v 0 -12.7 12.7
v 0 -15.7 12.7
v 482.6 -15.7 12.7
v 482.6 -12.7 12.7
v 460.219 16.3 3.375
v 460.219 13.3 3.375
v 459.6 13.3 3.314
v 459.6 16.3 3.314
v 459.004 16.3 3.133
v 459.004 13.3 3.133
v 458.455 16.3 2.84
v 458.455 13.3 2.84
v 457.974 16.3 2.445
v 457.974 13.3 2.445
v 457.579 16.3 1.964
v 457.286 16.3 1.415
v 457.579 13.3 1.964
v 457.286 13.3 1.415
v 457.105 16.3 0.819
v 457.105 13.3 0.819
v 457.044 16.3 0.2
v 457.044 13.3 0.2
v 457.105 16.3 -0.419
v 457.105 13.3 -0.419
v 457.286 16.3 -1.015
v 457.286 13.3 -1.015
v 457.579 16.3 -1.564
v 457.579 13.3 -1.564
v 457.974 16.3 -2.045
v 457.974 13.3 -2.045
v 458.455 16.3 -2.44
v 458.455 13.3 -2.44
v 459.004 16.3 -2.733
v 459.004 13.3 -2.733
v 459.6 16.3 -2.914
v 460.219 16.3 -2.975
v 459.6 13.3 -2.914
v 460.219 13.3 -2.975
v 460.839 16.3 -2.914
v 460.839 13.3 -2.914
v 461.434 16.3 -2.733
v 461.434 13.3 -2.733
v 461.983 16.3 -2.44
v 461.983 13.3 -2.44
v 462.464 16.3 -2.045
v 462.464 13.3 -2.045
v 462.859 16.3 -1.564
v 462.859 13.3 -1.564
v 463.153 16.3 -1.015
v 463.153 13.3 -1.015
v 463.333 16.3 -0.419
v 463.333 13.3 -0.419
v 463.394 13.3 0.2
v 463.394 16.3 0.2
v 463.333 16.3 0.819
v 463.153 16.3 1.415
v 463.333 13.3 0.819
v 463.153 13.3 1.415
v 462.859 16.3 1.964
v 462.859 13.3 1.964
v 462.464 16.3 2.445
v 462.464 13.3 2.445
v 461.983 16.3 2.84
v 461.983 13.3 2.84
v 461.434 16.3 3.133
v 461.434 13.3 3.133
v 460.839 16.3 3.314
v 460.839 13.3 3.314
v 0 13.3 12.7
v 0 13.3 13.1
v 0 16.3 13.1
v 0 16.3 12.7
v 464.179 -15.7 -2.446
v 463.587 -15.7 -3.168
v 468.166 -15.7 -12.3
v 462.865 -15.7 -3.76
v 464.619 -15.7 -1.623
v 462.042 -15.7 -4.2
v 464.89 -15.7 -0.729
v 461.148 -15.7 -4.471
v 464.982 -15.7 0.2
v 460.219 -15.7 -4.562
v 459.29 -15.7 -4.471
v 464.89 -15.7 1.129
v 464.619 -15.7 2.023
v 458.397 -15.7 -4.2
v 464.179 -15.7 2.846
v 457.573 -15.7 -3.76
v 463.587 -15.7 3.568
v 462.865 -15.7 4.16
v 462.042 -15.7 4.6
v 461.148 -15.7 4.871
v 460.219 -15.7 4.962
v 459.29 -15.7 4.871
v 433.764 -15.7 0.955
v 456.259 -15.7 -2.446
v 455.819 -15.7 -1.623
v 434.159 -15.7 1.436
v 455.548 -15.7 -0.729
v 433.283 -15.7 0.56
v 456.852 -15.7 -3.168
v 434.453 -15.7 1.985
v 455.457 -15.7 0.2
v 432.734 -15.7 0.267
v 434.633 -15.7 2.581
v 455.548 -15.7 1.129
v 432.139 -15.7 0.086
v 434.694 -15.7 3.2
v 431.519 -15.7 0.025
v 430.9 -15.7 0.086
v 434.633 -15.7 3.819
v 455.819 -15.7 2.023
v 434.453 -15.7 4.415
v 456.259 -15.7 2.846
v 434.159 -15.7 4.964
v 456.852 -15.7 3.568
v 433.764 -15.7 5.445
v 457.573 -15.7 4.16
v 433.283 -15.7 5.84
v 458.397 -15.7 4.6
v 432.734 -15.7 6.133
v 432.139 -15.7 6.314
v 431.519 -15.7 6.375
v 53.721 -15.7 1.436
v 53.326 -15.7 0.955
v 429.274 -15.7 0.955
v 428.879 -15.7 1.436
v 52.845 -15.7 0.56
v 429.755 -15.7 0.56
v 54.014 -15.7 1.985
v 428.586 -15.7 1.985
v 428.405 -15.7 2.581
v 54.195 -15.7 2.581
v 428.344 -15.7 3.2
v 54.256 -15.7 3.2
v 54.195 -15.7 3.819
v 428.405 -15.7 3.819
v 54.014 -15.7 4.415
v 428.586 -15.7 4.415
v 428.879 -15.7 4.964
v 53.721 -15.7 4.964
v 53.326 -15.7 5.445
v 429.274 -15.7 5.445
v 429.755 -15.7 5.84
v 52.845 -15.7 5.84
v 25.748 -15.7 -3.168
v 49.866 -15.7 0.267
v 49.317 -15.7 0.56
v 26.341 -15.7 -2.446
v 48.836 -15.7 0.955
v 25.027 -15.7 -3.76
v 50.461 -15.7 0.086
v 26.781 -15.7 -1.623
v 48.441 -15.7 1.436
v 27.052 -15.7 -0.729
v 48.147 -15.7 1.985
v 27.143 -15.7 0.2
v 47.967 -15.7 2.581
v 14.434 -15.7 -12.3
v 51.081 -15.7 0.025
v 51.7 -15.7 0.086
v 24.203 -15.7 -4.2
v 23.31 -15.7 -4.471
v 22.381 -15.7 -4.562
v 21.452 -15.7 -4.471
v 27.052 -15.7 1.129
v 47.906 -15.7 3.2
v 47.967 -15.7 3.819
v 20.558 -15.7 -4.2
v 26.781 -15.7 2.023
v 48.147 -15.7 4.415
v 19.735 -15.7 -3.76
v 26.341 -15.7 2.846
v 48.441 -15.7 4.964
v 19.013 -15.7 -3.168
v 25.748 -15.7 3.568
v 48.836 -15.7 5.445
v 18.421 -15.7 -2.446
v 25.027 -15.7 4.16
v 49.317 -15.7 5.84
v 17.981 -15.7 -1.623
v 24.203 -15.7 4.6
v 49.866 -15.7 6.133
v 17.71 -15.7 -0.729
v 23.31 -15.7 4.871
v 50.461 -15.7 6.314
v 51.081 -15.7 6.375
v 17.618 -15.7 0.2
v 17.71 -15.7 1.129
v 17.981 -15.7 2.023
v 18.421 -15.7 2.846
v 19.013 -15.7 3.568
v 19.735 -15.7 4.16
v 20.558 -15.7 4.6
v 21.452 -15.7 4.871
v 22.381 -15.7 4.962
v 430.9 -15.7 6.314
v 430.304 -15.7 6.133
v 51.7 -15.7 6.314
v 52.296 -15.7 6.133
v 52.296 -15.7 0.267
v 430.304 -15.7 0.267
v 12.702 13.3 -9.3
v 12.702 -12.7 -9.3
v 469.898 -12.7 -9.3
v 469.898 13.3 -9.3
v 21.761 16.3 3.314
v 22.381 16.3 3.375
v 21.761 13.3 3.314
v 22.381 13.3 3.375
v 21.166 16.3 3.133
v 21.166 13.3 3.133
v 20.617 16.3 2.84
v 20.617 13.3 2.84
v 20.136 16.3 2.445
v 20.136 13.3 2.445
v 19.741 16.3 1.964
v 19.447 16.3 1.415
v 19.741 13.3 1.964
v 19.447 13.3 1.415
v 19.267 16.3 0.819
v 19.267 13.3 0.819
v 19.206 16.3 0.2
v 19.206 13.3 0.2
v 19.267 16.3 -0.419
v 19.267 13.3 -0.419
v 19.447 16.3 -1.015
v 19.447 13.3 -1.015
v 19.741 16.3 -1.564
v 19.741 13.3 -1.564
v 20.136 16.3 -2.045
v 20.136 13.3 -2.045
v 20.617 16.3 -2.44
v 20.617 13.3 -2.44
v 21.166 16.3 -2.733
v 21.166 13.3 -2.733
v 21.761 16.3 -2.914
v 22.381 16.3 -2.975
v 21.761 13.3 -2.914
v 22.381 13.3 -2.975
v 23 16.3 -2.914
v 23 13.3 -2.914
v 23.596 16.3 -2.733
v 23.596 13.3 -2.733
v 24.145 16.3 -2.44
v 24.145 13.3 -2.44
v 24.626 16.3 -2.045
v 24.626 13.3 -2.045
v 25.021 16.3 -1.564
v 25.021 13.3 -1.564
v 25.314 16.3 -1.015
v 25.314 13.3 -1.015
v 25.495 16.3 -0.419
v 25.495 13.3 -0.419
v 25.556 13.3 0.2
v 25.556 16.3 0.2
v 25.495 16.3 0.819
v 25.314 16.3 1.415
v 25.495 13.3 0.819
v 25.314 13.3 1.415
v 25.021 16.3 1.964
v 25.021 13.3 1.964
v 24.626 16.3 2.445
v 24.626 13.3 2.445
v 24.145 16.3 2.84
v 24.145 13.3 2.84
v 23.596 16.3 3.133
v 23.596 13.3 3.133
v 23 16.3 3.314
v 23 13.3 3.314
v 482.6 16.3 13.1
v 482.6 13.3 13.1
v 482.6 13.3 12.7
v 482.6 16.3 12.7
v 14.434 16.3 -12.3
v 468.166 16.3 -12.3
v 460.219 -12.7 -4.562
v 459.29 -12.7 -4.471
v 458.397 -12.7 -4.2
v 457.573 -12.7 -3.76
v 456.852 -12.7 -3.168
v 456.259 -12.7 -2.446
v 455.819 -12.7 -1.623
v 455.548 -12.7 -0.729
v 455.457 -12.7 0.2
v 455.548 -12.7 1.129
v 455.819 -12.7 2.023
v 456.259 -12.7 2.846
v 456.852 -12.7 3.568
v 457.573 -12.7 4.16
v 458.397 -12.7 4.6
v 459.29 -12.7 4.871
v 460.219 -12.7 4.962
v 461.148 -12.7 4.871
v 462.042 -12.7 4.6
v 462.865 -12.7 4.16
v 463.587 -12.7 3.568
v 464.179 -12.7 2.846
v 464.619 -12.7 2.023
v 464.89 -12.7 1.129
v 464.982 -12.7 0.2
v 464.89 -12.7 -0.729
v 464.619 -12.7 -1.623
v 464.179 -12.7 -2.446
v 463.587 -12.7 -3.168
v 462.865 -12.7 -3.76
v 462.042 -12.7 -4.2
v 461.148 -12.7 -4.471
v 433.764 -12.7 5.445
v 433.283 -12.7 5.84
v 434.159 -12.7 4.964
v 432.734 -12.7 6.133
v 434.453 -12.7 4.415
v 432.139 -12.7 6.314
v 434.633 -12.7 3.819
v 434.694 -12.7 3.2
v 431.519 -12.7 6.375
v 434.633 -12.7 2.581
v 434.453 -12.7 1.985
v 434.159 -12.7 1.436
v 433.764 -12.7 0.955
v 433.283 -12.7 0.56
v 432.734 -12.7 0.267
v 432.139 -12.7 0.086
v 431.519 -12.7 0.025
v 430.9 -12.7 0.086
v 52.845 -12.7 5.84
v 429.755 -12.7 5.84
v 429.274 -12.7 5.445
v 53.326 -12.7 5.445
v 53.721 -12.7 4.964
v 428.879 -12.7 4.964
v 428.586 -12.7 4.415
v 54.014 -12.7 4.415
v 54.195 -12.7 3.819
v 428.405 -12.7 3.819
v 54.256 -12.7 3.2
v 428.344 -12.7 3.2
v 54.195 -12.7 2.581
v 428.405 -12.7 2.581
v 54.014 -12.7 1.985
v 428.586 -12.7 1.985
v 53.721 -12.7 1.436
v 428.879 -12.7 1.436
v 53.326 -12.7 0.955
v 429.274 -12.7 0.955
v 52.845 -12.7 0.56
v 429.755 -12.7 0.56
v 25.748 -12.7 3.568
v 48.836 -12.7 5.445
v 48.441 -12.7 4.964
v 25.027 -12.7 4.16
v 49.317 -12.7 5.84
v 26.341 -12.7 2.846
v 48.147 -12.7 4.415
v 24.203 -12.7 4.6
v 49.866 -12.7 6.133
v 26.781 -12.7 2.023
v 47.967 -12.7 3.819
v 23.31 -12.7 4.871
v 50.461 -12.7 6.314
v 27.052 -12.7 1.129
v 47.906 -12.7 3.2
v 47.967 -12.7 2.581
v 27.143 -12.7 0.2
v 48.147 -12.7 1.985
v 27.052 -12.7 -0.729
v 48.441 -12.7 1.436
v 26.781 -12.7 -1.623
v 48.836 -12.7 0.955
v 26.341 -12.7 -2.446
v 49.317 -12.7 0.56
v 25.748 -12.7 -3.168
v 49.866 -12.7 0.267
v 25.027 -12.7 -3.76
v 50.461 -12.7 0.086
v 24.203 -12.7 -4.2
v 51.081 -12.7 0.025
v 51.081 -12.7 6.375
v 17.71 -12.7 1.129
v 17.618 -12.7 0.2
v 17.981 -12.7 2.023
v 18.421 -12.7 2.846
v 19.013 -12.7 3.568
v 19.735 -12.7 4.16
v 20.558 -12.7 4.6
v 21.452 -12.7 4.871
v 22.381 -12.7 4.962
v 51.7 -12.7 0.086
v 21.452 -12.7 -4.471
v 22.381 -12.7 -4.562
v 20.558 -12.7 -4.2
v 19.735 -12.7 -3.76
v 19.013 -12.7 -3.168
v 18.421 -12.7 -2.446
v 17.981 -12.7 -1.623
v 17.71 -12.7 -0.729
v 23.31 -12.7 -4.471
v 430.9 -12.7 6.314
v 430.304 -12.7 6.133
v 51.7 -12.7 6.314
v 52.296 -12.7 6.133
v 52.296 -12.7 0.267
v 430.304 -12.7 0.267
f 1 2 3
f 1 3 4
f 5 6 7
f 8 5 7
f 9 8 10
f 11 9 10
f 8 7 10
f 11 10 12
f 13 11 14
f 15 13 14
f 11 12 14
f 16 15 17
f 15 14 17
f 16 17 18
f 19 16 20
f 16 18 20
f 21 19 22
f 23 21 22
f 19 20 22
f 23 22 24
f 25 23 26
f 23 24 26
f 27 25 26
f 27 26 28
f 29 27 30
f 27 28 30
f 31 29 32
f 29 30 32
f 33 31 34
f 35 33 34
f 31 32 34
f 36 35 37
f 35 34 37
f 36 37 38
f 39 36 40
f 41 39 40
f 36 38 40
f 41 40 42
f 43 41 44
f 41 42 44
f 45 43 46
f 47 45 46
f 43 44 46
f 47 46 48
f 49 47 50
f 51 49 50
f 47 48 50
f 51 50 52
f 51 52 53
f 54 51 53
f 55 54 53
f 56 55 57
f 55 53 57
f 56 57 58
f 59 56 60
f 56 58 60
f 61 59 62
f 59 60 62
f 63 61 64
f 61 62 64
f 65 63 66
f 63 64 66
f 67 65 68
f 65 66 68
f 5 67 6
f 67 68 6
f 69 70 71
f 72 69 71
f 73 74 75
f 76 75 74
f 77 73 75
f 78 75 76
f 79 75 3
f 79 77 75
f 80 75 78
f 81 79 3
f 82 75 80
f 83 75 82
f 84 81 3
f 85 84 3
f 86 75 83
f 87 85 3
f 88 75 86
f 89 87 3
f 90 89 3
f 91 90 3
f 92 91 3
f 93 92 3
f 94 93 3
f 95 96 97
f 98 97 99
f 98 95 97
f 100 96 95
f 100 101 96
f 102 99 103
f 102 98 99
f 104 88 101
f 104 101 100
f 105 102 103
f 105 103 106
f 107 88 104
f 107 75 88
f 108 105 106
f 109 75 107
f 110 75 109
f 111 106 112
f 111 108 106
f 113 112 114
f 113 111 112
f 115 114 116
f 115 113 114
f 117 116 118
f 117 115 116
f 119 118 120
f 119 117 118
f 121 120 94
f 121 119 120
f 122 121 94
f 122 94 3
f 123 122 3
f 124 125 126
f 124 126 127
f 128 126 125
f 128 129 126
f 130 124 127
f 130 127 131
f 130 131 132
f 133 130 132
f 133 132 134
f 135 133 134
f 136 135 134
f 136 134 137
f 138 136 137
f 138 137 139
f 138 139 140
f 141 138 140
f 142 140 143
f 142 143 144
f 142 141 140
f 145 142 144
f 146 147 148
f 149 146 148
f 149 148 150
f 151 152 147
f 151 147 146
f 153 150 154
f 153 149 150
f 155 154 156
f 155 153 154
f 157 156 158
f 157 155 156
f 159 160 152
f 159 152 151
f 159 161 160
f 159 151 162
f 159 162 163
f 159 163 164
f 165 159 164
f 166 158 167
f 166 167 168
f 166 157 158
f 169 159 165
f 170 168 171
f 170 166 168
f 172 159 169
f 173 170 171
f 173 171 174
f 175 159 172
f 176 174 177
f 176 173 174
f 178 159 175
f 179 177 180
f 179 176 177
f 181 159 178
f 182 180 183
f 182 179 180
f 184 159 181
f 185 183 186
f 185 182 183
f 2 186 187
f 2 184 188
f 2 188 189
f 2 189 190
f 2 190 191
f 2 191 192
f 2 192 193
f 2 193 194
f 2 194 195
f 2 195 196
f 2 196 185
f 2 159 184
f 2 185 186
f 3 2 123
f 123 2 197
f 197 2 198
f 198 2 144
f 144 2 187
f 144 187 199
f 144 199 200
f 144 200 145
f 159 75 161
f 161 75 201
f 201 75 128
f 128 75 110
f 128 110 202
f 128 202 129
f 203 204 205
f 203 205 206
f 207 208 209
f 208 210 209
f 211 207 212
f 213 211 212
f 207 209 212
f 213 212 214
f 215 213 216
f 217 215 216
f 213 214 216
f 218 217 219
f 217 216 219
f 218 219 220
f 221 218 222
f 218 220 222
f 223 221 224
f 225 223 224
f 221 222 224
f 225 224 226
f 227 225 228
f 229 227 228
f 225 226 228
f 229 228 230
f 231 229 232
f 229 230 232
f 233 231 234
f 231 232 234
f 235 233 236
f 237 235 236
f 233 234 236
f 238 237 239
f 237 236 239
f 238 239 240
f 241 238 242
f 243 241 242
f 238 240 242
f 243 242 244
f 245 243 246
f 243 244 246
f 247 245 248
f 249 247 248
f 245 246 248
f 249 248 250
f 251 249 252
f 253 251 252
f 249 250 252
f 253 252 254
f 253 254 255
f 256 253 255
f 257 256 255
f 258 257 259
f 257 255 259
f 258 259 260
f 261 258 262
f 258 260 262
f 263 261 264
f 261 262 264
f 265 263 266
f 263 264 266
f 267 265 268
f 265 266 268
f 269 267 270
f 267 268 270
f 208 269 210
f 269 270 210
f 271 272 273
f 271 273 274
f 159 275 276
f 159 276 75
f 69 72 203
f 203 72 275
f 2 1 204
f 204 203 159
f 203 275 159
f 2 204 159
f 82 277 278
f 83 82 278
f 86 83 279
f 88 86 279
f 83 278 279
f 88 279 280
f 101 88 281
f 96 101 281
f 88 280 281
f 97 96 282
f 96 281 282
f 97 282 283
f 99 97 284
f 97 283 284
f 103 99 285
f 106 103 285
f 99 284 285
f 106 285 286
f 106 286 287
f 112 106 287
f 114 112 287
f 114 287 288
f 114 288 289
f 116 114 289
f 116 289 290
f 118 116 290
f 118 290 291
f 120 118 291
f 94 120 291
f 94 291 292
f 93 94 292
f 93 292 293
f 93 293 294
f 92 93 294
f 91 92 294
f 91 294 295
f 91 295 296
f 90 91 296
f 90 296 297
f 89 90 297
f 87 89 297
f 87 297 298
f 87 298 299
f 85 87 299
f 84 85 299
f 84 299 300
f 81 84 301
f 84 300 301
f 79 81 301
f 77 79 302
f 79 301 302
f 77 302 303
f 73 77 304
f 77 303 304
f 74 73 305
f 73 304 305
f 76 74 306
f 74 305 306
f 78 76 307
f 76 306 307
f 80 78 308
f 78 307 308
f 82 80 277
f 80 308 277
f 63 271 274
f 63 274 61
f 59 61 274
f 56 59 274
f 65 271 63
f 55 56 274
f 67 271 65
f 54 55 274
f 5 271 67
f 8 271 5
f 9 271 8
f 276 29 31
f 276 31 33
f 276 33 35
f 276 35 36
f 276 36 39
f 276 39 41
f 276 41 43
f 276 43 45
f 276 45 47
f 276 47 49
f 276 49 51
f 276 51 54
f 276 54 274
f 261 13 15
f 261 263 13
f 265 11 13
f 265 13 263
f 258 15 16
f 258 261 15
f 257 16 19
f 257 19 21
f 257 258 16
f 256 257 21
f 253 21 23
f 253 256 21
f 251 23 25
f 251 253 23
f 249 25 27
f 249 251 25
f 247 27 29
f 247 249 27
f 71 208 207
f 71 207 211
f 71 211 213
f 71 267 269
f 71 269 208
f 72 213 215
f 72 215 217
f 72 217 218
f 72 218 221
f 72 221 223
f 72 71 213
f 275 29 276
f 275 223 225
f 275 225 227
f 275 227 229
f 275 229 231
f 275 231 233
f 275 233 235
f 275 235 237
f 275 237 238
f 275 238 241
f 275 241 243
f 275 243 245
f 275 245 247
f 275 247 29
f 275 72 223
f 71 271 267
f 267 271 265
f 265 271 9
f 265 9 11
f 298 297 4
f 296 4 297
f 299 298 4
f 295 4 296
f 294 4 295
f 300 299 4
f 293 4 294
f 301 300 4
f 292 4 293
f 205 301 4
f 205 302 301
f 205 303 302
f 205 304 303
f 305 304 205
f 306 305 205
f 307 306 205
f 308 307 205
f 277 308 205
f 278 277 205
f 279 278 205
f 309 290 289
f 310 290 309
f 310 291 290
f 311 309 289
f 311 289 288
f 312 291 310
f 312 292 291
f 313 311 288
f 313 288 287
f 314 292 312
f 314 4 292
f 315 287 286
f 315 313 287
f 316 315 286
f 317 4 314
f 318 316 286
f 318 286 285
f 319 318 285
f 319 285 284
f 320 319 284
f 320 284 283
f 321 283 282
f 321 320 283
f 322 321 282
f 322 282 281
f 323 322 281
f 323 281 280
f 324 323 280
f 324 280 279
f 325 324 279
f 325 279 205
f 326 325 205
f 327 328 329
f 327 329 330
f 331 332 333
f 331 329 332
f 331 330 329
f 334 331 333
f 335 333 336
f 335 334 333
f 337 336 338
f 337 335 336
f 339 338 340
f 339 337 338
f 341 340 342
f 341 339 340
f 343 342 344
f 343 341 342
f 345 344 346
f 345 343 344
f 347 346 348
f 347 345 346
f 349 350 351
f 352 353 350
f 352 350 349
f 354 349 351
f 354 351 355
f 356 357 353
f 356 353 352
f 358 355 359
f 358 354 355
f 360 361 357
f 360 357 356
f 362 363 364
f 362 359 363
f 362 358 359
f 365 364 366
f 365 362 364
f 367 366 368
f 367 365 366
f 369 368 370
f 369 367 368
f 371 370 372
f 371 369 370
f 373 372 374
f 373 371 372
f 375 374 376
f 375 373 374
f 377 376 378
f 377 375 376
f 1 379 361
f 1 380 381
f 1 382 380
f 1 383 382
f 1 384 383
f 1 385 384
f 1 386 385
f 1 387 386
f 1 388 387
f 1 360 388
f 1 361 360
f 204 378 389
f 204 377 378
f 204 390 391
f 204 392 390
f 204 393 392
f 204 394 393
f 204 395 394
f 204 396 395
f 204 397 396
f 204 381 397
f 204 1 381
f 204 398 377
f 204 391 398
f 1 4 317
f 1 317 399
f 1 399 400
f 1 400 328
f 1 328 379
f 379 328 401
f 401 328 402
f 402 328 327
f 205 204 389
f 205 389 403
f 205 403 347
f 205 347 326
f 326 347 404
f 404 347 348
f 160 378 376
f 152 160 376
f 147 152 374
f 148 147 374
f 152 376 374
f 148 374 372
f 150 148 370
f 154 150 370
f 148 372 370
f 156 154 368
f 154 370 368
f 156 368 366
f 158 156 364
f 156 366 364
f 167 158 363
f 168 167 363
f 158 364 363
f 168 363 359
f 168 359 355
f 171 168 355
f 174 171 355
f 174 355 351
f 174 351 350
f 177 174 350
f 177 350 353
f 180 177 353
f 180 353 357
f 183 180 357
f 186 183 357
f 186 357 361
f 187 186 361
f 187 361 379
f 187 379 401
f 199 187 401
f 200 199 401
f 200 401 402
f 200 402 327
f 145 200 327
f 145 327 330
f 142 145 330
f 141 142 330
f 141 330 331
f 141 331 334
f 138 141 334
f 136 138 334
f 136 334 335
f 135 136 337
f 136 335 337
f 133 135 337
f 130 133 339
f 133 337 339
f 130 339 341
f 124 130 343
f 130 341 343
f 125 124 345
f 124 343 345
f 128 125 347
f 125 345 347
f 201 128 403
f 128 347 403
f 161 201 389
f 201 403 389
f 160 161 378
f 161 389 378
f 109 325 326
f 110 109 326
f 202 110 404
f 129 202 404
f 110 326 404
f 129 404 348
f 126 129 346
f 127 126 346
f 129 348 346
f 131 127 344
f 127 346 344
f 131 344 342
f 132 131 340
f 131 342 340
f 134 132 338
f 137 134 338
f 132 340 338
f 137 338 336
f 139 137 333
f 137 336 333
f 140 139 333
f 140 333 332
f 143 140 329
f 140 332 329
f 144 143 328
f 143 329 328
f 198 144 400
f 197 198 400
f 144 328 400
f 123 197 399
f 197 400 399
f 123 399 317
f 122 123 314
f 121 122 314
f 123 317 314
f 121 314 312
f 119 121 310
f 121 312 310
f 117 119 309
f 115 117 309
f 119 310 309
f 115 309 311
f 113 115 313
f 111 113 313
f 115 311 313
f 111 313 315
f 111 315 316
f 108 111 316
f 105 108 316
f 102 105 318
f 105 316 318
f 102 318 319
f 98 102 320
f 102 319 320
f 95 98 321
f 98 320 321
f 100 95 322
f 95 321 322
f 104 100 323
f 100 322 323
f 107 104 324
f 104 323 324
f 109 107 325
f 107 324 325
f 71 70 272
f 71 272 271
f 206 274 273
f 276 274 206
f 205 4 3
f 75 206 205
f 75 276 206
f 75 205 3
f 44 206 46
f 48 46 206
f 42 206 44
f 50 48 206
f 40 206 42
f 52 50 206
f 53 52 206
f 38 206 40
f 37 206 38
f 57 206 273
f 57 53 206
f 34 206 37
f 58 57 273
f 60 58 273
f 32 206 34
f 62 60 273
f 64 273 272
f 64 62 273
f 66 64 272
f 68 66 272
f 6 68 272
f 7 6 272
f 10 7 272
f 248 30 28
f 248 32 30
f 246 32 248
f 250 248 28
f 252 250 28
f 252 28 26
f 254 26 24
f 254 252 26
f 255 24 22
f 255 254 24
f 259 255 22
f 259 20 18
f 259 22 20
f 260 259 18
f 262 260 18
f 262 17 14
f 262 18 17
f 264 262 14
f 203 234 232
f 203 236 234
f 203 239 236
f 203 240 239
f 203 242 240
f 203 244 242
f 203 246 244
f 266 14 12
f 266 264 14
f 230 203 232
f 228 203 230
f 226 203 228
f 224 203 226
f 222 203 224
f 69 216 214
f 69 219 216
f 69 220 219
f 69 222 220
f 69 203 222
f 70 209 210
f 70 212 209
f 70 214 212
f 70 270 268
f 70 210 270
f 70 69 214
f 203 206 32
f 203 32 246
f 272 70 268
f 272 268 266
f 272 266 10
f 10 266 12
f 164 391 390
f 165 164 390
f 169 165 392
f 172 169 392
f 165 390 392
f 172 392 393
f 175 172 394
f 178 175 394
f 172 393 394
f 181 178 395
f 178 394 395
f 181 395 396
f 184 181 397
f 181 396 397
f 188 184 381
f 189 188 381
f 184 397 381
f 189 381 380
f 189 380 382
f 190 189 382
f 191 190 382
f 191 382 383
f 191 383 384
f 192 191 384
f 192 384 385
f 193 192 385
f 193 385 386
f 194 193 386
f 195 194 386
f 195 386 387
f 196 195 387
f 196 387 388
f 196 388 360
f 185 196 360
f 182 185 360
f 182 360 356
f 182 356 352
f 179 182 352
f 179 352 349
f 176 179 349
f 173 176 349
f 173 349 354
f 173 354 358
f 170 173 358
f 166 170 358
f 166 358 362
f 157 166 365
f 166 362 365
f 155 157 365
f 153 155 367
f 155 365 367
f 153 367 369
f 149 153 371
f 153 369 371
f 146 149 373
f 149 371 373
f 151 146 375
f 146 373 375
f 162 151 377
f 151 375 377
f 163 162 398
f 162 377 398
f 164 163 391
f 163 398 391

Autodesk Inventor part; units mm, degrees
ref_plane "YZ Plane" through (0, 0, 0) normal (1, 0, 0) x (0, 1, 0)
ref_plane "XZ Plane" through (0, 0, 0) normal (0, 1, 0) x (-1, 0, 0)
ref_plane "XY Plane" through (0, 0, 0) normal (0, 0, 1) x (1, 0, 0)
sketch "Sketch1" plane through (0, 0, 0) normal (1, 0, 0) x (0, 1, 0)
  line L0 (-15.7, 12.7) -> (-12.7, 12.7)
  line L1 (-12.7, 12.7) -> (-12.7, -9.3)
  line L2 (-12.7, -9.3) -> (13.3, -9.3)
  line L3 (13.3, -9.3) -> (13.3, 13.1)
  line L4 (13.3, 13.1) -> (16.3, 13.1)
  line L5 (16.3, 13.1) -> (16.3, -12.3)
  line L6 (16.3, -12.3) -> (-15.7, -12.3)
  line L7 (-15.7, -12.3) -> (-15.7, 12.7)
  point P0 (0, 0)
  point P1 (0.3, 0.2)
  dimension "d0" = 3
  dimension "d1" = 3
  dimension "d2" = 25
  dimension "d3" = 32
  dimension "d4" = 16
  dimension "d5" = 12.5
  dimension "d6" = 3
  dimension "d44" = 22.4
  dimension "d45" = 16.3
  dimension "d46" = 13.1
extrude "Extrusion1" add sketch "Sketch1" along normal blind 482.6
sketch "Sketch3" plane through (0.7366, -15.7, 12.7) normal (0, -1, 0) x (1, 0, 0)
  line L0 (0, 0) -> (14.6558, -25.4) projected
  line L1 (-0.7366, -25) -> (481.8634, -25) projected
  line L2 (466.471, -25.4) -> (481.1268, 0) projected
  line L3 (-0.7366, 0) -> (481.8634, 0) projected
  line L4 (7.3279, -12.7) -> (473.7989, -12.7) construction
  line L5 (14.4316, 0) -> (28.8566, -25) construction
  circle A0 centre (21.6441, -12.5) radius 4.7625
  line L6 (466.6952, 0) -> (452.2702, -25) construction
  circle A1 centre (459.4827, -12.5) radius 4.7625
  point P0 (-0.7366, -12.7)
  dimension "d18" = 12.5
  dimension "d19" = 9.525
  dimension "d20" = 12.5
  dimension "d21" = 9.525
hole "Access Hole" at (22.3807, -15.7, 0.2) at (460.2193, -15.7, 0.2) direction (0, 1, 0) diameter 9.525 depth 3 tip angle 118
sketch "Sketch4" plane through (0.7366, 16.3, 12.7) normal (0, 1, 0) x (1, 0, 0)
  circle A0 centre (21.6441, 12.5) radius 4.7625 projected
  circle A1 centre (459.4827, 12.5) radius 4.7625 projected
  circle A2 centre (21.6441, 12.5) radius 3.175
  circle A3 centre (459.4827, 12.5) radius 3.175
  point P0 (-0.7366, 12.7)
  dimension "d29" = 6.35
  dimension "d30" = 6.35
hole "Mounting Hole" at (22.3807, 16.3, 0.2) at (460.2193, 16.3, 0.2) direction (0, -1, 0) diameter 6.35 depth 3 tip angle 118
chamfer "Chamfer1" distance 25 angle 30 1 edges at (0, 0.3, -12.3) measured on face at (0, 4.6333, -11.3)
chamfer "Chamfer2" distance 25 angle 30 1 edges at (482.6, 0.3, -12.3) measured on face at (482.6, 4.6333, -11.3)
sketch "Sketch5" plane through (0, -15.7, 12.7) normal (0, -1, 0) x (1, 0, 0)
  circle A0 centre (22.3807, -12.5) radius 4.7625 projected
  circle A1 centre (460.2193, -12.5) radius 4.7625 projected
  line L0 (0, 0) -> (482.6, 0) projected
  line L1 (14.4338, -25) -> (468.1662, -25) projected
  line L2 (51.0807, 0) -> (51.0807, -25) construction
  line L3 (431.5193, 0) -> (431.5193, -25) construction
  circle A2 centre (431.5193, -9.5) radius 3.175
  circle A3 centre (51.0807, -9.5) radius 3.175
  point P0 (0, -12.7)
  dimension "d47" = 28.7
  dimension "d49" = 28.7
  dimension "d61" = 6.35
  dimension "d62" = 15.5
  dimension "d63" = 6.35
  dimension "d71" = 51.0807
hole "Hole4" at (51.0807, -15.7, 3.2) at (431.5193, -15.7, 3.2) direction (0, 1, 0) diameter 6.35 depth 3 tip angle 118
equation "\"d1\" = d0"
equation "\"d4\" = 0.5 * d3"
equation "\"d5\" = 0.5 * d2"
equation "\"d6\" = d0"
equation "\"d19\" = d21"
equation "\"d49\" = d47"
properties part number "19in c-channel-top"
